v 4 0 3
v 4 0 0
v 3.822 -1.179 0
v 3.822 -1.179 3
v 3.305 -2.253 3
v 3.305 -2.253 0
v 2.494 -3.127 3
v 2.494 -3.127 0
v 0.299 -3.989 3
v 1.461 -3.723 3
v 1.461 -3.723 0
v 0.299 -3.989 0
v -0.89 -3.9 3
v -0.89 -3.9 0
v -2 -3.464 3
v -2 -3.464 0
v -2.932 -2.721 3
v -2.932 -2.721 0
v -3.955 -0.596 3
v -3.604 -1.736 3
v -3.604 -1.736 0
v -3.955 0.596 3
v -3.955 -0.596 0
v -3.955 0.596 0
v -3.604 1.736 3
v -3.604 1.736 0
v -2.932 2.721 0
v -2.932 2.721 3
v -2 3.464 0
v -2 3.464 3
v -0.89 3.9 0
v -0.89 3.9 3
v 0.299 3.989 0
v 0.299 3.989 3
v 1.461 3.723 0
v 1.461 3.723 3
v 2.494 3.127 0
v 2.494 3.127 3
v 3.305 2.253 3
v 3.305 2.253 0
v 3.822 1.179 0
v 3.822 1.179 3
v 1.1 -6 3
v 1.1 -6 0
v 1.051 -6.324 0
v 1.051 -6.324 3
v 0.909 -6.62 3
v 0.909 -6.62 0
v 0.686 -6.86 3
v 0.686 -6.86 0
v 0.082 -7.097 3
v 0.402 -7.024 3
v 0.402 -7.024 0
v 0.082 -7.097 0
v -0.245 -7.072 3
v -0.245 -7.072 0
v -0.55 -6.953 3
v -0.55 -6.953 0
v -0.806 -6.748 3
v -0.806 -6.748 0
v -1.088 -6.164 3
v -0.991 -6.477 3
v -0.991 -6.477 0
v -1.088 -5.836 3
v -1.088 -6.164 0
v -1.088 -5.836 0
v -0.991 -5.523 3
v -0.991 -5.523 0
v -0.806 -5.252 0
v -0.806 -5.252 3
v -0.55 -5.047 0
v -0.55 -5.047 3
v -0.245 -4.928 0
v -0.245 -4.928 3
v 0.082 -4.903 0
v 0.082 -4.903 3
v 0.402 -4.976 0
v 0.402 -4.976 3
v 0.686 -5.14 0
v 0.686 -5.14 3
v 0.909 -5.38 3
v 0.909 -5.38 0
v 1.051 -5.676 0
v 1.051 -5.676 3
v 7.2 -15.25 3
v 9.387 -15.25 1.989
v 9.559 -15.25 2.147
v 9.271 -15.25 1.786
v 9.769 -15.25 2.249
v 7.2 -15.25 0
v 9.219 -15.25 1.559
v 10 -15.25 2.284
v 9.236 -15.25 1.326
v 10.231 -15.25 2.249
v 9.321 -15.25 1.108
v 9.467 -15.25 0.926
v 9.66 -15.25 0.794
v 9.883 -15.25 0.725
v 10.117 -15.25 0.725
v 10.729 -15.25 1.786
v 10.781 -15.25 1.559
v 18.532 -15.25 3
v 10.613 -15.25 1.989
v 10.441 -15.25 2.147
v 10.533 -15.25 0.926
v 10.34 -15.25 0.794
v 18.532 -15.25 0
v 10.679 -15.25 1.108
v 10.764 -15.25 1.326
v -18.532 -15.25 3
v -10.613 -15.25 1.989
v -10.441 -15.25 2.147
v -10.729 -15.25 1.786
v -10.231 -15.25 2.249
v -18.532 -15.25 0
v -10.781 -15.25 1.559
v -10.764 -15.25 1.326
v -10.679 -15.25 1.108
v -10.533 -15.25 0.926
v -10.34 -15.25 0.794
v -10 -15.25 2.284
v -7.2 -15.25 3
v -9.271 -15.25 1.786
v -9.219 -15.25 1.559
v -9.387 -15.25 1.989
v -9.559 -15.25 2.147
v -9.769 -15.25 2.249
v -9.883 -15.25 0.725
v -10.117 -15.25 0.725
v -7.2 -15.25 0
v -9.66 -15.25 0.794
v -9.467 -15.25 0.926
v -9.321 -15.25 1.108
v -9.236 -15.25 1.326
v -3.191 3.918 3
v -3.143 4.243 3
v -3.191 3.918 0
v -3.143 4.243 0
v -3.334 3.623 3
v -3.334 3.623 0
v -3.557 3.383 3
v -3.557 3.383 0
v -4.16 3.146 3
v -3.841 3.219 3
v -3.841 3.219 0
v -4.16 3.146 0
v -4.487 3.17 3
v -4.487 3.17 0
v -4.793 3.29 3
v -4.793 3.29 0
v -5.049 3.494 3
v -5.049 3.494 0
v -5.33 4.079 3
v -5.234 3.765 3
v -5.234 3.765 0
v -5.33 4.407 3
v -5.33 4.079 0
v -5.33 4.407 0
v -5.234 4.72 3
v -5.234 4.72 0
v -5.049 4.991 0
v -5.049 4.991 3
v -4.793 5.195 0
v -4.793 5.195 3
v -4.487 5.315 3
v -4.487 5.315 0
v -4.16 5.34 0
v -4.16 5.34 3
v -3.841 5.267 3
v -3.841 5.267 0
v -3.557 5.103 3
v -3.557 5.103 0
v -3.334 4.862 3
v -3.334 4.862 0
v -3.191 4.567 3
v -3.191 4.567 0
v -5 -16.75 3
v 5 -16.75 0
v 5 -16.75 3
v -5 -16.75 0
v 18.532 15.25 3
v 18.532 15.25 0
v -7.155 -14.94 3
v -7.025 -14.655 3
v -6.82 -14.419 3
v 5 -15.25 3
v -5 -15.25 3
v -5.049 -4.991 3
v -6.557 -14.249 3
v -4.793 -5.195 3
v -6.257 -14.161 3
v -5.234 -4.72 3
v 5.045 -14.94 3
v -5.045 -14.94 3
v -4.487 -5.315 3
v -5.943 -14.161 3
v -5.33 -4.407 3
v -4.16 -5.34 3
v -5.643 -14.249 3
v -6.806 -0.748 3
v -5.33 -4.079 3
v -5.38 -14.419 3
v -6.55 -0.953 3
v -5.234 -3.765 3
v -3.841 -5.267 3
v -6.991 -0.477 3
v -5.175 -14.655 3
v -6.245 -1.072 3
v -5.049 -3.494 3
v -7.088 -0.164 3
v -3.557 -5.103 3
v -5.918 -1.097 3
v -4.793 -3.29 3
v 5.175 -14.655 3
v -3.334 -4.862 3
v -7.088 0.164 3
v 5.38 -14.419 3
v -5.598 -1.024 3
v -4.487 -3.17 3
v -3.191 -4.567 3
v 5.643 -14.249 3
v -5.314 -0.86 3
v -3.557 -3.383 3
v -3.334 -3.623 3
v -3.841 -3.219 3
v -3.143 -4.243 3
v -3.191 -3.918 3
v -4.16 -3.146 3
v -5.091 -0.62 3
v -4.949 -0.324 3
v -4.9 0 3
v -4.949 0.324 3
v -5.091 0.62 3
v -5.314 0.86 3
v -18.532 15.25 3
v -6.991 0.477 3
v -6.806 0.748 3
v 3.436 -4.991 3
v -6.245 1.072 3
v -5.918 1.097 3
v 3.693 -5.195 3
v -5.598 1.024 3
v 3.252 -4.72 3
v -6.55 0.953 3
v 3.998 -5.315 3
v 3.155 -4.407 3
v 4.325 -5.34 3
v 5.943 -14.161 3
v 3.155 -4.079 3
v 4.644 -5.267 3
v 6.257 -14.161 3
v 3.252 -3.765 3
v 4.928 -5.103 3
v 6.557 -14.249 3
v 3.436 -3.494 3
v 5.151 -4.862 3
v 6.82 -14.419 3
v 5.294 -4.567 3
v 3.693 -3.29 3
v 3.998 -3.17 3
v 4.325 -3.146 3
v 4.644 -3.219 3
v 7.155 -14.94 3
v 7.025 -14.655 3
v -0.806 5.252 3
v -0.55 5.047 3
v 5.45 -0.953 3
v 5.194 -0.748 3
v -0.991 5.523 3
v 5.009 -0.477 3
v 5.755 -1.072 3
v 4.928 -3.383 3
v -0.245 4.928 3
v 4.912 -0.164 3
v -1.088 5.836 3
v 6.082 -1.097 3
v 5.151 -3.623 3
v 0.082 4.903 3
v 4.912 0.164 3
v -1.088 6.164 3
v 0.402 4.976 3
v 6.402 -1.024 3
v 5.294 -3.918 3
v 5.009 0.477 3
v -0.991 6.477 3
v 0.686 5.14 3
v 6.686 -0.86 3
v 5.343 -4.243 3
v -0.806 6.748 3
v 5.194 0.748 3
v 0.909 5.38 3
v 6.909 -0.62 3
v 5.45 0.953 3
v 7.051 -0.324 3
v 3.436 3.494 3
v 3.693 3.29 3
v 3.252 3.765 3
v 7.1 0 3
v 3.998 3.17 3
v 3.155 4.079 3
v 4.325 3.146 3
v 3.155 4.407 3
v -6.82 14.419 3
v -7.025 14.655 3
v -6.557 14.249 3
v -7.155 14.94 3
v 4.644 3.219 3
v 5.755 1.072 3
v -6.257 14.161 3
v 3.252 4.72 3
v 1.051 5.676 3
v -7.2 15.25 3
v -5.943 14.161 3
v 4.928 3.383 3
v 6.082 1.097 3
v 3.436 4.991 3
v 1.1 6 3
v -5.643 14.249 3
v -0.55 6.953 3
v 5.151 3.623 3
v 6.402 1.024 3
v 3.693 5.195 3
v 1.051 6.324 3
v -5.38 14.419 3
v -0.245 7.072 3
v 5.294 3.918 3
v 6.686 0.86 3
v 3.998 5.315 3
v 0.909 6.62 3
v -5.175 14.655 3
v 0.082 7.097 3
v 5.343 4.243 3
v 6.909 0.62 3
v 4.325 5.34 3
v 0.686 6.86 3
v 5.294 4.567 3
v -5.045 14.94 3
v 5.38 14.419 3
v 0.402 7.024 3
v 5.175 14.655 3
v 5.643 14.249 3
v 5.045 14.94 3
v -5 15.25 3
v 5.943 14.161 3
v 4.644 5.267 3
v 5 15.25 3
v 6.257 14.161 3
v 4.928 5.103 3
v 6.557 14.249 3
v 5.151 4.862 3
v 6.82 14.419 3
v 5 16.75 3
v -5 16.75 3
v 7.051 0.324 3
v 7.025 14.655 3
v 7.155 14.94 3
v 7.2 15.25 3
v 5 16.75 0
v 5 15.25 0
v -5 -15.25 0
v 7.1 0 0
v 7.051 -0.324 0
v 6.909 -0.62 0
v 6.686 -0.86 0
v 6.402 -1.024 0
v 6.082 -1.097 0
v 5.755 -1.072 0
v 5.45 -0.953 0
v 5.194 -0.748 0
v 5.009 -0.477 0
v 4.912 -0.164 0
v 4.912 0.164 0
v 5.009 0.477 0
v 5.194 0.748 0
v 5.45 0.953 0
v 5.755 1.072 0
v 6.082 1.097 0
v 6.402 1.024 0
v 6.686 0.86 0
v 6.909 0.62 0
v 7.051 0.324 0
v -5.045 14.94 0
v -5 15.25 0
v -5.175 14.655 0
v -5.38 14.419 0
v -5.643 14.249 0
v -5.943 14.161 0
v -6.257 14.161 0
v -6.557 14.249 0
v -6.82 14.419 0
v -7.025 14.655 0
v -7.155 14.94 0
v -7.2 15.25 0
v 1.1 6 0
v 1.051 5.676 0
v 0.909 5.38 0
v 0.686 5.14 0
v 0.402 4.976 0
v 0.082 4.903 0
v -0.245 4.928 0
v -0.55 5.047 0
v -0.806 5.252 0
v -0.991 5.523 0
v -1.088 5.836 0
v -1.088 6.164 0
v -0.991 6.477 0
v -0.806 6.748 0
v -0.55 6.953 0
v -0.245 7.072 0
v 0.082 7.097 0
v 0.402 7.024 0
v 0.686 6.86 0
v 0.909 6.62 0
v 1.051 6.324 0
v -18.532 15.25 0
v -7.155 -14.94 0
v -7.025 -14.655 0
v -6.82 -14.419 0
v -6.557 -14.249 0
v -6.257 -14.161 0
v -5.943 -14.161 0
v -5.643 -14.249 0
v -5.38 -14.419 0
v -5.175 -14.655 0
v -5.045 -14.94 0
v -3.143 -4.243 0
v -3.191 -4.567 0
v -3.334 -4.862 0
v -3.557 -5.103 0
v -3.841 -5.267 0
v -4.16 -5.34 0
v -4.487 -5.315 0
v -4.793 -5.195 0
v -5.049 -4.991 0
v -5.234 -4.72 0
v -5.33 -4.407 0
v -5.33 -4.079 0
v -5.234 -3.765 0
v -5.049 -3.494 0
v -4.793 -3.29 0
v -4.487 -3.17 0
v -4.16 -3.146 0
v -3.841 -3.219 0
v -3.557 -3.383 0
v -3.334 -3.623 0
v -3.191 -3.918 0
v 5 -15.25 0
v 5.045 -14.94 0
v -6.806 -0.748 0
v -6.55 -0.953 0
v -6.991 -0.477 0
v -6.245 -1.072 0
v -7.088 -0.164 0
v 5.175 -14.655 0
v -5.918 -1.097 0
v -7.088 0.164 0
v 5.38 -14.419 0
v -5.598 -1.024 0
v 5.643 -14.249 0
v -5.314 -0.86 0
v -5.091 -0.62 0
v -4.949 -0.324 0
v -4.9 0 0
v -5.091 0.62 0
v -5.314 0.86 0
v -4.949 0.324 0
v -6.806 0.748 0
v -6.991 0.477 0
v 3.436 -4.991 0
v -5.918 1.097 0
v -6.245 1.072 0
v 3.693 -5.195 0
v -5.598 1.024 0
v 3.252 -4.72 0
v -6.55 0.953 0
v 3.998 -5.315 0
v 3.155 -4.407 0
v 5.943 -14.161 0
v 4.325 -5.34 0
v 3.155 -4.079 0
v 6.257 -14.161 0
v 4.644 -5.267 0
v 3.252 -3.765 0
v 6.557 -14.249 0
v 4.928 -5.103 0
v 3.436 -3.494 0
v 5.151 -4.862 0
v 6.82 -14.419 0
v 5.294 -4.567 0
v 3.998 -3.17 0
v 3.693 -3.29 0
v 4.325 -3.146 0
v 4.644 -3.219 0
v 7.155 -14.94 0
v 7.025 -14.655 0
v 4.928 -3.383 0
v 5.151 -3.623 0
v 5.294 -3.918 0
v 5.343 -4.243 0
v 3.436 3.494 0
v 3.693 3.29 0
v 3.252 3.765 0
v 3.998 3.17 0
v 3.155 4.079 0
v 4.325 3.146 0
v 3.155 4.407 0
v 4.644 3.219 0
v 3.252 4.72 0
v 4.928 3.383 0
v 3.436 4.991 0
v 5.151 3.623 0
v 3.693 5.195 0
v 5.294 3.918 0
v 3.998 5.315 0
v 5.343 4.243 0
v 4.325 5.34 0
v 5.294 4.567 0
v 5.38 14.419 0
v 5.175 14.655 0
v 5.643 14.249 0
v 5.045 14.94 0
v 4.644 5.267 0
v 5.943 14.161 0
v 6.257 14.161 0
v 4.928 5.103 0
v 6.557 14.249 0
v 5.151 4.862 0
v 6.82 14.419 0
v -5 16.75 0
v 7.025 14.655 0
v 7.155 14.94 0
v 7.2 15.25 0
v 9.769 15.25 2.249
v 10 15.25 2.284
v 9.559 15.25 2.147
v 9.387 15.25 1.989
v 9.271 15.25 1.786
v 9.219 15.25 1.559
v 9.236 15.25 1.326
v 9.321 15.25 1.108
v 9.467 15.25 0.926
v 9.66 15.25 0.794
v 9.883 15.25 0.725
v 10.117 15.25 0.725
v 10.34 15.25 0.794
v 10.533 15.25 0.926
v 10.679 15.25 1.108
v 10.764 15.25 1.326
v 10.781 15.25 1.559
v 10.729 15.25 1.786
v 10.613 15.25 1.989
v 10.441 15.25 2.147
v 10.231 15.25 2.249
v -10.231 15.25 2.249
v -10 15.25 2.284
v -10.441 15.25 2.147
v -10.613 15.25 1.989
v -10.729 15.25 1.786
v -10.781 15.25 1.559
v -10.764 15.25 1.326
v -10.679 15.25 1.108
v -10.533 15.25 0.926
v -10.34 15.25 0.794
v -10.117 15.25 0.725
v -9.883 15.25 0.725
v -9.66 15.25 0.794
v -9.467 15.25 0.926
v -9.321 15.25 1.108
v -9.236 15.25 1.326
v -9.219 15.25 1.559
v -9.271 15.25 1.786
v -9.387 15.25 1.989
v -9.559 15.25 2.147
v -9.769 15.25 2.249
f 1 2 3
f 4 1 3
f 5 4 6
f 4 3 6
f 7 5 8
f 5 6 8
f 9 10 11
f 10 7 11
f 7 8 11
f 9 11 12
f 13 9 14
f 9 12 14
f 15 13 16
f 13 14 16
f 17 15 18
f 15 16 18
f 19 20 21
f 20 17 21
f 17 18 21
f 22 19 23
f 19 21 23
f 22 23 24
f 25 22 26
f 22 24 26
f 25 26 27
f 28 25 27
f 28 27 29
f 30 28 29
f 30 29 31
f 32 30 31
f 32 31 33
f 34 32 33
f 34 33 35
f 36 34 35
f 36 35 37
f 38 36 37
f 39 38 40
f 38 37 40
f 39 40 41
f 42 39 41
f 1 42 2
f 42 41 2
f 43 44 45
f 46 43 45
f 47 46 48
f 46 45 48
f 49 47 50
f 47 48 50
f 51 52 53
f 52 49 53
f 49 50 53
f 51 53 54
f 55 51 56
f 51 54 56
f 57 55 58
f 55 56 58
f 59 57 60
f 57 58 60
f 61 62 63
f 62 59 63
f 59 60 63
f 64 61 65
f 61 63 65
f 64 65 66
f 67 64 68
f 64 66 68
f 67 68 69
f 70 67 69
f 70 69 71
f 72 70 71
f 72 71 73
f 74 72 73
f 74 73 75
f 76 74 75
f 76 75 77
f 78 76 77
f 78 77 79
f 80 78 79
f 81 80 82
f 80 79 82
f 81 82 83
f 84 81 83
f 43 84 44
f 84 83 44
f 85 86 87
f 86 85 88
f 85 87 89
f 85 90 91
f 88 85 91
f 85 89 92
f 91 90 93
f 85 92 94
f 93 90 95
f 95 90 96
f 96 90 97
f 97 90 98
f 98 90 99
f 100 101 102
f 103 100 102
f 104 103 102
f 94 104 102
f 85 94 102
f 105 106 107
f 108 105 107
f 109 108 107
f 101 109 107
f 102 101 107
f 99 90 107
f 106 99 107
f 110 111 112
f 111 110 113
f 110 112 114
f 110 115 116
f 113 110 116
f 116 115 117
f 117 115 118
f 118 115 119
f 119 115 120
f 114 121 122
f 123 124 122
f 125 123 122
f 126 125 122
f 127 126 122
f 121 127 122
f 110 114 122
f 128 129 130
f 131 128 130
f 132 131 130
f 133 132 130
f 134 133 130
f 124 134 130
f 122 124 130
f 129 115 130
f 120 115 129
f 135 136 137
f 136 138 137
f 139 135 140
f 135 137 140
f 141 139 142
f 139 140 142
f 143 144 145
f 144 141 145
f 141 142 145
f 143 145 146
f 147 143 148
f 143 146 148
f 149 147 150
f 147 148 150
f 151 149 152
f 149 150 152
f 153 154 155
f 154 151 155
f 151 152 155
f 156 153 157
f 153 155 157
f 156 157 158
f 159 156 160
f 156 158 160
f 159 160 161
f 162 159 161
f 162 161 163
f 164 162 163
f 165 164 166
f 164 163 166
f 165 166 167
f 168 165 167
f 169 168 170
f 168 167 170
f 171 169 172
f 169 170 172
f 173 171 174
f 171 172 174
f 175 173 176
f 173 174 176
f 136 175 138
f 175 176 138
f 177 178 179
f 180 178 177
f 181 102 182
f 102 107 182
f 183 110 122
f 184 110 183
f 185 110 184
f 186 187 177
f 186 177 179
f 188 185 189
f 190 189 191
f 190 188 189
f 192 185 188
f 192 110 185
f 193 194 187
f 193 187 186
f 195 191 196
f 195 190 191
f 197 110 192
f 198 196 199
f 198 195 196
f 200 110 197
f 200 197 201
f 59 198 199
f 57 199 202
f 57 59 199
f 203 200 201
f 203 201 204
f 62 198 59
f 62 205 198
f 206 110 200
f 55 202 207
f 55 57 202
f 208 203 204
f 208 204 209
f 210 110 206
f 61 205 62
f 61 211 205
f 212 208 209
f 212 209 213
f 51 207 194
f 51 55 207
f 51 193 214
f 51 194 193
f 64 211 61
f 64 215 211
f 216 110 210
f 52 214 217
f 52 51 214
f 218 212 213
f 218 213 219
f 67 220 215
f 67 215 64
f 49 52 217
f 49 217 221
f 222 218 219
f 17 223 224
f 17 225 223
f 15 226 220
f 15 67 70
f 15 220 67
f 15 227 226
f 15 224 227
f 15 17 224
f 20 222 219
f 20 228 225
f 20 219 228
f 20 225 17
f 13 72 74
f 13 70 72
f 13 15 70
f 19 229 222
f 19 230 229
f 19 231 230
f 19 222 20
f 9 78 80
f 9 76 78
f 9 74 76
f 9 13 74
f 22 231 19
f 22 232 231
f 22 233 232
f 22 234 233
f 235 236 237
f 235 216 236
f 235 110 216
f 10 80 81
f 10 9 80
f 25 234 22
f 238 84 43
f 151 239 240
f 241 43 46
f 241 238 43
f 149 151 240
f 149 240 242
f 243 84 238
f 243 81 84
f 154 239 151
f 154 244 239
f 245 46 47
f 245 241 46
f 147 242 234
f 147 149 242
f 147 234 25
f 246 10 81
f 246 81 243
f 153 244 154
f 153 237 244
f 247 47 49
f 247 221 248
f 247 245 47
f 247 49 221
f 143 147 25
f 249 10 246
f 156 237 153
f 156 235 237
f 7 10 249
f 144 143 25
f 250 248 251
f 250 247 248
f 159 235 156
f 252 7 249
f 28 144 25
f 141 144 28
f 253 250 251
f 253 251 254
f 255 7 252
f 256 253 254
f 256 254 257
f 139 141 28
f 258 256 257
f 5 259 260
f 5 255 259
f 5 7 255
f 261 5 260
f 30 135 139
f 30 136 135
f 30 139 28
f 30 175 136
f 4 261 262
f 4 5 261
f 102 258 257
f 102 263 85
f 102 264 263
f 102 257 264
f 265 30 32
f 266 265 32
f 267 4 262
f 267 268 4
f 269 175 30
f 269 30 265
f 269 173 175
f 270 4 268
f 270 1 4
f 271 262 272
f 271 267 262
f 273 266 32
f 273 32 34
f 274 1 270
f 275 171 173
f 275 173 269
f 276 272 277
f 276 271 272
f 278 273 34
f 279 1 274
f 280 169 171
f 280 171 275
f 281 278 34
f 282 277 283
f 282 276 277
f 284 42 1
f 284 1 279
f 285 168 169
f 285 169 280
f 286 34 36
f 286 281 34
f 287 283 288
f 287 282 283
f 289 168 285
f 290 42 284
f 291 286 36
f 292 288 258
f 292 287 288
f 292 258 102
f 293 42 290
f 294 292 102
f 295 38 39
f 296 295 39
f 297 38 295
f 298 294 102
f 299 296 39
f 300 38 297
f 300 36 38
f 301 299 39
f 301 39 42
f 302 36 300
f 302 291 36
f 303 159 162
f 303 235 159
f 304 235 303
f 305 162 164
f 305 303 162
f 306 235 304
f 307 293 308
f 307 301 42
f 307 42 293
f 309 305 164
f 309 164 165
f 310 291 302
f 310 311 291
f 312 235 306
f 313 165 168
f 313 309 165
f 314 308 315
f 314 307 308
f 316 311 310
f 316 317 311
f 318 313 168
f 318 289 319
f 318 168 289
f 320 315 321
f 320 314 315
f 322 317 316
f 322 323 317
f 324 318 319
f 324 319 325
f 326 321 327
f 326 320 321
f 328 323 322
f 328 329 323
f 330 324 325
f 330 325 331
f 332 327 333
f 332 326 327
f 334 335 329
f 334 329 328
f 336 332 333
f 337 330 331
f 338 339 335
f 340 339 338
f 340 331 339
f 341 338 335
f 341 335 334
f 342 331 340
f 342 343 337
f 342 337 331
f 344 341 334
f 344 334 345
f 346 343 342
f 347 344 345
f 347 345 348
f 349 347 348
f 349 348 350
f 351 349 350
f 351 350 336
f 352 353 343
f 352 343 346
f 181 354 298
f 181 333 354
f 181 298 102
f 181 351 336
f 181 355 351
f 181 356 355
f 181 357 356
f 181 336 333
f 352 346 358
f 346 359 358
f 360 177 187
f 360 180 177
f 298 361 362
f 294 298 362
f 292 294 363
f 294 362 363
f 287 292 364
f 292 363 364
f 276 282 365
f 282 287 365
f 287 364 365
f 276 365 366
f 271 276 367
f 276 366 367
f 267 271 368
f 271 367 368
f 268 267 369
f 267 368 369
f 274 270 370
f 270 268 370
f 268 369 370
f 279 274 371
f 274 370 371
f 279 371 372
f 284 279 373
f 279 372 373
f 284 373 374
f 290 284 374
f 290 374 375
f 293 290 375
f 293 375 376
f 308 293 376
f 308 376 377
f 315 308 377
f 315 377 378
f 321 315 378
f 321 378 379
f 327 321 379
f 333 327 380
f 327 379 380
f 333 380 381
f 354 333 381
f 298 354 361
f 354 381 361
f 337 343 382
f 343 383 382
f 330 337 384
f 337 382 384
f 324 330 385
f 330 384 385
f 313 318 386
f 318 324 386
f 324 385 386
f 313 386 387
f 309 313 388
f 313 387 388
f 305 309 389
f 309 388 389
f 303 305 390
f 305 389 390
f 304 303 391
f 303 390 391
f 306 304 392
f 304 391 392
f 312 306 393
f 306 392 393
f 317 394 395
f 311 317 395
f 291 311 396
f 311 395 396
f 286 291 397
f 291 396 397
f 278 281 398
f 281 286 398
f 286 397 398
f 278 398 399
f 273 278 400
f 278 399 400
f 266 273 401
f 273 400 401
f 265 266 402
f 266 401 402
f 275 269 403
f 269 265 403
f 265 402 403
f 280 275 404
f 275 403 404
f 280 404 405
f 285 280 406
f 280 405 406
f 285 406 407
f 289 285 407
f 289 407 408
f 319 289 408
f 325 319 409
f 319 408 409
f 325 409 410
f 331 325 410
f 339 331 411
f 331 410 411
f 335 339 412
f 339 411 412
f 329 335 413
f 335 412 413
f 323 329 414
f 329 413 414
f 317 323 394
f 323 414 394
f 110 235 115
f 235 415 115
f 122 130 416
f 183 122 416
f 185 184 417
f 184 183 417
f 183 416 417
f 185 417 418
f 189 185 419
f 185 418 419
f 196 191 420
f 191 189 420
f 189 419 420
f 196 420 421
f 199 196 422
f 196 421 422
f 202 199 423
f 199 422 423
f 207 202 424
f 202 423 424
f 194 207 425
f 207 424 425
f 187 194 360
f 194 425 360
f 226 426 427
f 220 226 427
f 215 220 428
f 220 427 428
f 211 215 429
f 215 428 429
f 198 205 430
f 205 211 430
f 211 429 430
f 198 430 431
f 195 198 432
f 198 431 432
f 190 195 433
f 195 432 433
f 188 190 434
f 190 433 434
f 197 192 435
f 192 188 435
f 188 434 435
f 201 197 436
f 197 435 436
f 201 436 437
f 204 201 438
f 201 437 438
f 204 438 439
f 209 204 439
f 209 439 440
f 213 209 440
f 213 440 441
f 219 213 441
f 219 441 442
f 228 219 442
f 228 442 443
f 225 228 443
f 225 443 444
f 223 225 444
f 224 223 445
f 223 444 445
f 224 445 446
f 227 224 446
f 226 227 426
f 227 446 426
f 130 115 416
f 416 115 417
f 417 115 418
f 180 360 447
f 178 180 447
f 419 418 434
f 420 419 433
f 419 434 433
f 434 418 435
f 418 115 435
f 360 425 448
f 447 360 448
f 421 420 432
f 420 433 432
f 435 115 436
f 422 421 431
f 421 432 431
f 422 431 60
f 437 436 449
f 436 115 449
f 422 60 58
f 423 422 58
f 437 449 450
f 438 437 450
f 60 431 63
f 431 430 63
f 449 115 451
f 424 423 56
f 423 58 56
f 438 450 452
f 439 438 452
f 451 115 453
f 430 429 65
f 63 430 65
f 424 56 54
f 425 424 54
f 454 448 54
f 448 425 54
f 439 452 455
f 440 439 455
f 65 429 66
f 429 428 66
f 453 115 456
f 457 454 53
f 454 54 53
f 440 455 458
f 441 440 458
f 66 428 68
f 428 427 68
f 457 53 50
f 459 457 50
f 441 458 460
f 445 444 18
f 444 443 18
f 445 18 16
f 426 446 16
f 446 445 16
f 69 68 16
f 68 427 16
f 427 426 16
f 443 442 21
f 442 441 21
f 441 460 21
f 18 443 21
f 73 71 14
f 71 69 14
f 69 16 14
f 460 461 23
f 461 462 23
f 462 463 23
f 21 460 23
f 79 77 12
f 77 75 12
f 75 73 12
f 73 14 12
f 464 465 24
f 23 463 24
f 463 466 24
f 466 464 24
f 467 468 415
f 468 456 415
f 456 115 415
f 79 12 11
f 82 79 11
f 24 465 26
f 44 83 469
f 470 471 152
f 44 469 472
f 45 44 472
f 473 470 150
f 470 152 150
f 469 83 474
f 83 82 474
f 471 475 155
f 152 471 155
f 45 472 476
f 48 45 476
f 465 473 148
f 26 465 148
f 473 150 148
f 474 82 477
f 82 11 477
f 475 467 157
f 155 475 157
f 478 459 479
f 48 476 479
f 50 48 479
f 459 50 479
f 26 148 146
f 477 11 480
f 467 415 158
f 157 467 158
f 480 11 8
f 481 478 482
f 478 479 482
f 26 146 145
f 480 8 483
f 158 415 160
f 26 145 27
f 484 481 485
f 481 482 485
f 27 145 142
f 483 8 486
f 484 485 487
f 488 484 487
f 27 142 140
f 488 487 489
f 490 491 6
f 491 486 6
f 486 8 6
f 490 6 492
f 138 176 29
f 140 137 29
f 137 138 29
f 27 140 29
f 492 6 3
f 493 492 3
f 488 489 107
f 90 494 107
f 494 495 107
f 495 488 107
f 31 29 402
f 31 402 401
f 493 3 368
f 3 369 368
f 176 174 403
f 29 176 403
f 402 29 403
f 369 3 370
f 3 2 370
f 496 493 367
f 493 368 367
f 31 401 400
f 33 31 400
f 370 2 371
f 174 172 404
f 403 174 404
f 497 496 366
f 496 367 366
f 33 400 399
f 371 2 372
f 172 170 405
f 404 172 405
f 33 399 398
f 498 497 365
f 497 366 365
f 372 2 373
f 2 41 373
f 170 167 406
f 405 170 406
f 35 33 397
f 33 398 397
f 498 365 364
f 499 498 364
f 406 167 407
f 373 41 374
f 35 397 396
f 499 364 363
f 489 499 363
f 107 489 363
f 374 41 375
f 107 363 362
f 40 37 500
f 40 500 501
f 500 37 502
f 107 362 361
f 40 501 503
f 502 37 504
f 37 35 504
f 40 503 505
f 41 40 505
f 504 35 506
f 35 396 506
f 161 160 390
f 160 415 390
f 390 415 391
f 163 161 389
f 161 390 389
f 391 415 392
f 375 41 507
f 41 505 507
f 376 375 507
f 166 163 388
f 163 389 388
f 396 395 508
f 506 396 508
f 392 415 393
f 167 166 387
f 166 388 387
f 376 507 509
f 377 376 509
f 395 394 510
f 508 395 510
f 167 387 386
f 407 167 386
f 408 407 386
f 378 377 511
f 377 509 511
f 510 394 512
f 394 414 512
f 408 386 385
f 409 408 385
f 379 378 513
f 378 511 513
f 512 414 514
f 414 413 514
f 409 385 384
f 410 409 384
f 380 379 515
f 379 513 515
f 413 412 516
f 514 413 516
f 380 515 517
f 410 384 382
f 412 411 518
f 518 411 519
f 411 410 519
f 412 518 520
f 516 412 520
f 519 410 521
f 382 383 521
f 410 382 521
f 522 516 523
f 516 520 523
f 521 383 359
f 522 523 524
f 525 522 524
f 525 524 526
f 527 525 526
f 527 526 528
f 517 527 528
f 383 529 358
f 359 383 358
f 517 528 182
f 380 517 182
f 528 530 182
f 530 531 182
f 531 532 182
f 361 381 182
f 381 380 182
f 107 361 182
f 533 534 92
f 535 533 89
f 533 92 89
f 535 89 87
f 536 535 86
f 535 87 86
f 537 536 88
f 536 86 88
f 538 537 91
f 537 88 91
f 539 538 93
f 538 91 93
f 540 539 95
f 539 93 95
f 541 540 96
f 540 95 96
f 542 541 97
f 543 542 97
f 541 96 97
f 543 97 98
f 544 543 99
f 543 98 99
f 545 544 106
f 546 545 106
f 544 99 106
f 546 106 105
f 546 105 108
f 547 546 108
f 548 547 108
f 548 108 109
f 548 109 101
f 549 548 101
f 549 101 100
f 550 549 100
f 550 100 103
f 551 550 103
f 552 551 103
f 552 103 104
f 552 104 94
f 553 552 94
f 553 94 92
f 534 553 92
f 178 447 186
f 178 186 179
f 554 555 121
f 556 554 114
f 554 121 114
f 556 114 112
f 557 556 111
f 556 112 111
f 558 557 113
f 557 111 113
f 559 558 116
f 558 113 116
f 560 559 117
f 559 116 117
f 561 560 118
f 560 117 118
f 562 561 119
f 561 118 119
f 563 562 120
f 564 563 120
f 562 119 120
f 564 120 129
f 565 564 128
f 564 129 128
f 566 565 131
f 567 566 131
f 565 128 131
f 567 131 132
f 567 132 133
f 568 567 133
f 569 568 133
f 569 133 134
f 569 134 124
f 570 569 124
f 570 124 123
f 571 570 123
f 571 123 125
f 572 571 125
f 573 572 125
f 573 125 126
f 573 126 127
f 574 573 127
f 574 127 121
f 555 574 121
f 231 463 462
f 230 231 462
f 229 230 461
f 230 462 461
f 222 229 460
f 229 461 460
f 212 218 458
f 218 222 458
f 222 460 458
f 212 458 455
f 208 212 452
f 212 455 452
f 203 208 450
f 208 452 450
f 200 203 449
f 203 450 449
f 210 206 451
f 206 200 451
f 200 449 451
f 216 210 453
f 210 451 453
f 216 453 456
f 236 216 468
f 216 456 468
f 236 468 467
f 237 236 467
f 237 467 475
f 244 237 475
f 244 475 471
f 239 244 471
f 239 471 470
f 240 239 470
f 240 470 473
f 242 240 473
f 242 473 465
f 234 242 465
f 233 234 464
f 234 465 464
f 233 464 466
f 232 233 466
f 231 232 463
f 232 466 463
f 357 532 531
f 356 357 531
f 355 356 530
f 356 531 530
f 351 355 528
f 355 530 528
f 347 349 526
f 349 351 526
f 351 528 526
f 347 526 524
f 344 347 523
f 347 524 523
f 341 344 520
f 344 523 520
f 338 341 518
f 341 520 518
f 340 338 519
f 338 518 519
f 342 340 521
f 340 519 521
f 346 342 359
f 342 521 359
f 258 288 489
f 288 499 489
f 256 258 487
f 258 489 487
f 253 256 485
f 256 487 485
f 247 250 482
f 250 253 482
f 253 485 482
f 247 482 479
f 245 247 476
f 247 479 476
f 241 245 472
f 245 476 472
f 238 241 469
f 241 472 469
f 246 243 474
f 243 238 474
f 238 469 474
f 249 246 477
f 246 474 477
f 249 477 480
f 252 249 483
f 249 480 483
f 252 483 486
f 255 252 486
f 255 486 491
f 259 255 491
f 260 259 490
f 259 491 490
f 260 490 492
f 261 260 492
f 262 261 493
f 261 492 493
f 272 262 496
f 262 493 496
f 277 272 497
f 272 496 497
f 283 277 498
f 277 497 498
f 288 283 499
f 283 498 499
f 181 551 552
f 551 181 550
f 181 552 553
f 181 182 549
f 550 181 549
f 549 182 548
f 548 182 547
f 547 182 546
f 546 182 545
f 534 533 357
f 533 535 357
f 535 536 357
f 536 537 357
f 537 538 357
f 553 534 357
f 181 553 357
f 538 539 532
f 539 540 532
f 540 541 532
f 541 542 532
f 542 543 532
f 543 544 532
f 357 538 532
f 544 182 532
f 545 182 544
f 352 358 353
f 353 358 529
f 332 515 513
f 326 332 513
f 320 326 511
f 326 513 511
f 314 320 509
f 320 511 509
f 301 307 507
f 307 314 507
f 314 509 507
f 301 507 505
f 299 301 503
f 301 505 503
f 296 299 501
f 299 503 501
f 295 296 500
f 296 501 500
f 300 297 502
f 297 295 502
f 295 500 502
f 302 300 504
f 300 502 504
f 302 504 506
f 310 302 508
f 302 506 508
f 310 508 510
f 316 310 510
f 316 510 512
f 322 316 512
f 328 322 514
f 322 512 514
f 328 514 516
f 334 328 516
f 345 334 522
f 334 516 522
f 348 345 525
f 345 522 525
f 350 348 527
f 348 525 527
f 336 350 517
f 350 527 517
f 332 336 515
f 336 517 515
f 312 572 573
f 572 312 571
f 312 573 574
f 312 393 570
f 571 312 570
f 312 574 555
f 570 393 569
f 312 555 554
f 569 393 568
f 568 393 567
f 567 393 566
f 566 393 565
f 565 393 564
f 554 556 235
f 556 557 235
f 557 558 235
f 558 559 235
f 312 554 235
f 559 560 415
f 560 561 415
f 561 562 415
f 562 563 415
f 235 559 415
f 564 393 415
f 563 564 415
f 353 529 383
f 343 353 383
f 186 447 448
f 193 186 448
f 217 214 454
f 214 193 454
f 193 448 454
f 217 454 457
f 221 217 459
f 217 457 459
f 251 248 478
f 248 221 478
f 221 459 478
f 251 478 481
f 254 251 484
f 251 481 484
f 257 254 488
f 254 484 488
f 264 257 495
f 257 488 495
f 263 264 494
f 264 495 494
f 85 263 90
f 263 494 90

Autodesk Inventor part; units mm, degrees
ref_plane "YZ Plane" through (0, 0, 0) normal (1, 0, 0) x (0, 1, 0)
ref_plane "XZ Plane" through (0, 0, 0) normal (0, 1, 0) x (-1, 0, 0)
ref_plane "XY Plane" through (0, 0, 0) normal (0, 0, 1) x (1, 0, 0)
sketch "スケッチ1" plane through (0, 0, 0) normal (0, 0, 1) x (1, 0, 0)
  circle A0 centre (0, 0) radius 4
  circle A1 centre (0, 0) radius 6 construction
  circle A2 centre (0, 6) radius 1.1
  circle A3 centre (-4.2426, 4.2426) radius 1.1
  circle A4 centre (-6, 0) radius 1.1
  circle A5 centre (-4.2426, -4.2426) radius 1.1
  circle A6 centre (0, -6) radius 1.1
  circle A7 centre (4.2426, -4.2426) radius 1.1
  circle A8 centre (6, 0) radius 1.1
  circle A9 centre (4.2426, 4.2426) radius 1.1
  line L0 (-18.5321, -15.25) -> (18.5321, -15.25)
  line L1 (18.5321, -15.25) -> (18.5321, 15.25)
  line L2 (18.5321, 15.25) -> (-18.5321, 15.25)
  line L3 (-18.5321, 15.25) -> (-18.5321, -15.25)
  line L4 (-18.5321, -15.25) -> (18.5321, 15.25) construction
  line L5 (18.5321, -15.25) -> (-18.5321, 15.25) construction
  circle A10 centre (0, 0) radius 24
  line L6 (18.5321, 0) -> (-18.5321, 0) construction
  line L7 (0, 18.25) -> (0, 0) construction
  line L8 (-5, 15.25) -> (5, 15.25)
  line L9 (5, 15.25) -> (5, 16.75)
  line L10 (5, 16.75) -> (-5, 16.75)
  line L11 (-5, 16.75) -> (-5, 15.25)
  circle A11 centre (-6.1, 15.25) radius 1.1
  circle A12 centre (6.1, 15.25) radius 1.1
  line L12 (-5, -15.25) -> (5, -15.25)
  line L13 (5, -15.25) -> (5, -16.75)
  line L14 (5, -16.75) -> (-5, -16.75)
  line L15 (-5, -16.75) -> (-5, -15.25)
  circle A13 centre (-6.1, -15.25) radius 1.1
  circle A14 centre (6.1, -15.25) radius 1.1
  point P0 (0, 16.75)
  point P1 (0, -18.25)
  point P2 (0, -16.75)
  point P3 (7.2, 15.25)
  point P4 (-7.2, 15.25)
  point P5 (7.2, -15.25)
  point P6 (-7.2, -15.25)
  dimension "d1" = 12
  dimension "d11" = 48
  dimension "d23" = 2.2
  dimension "d24" = 2.2
  dimension "d0" = 8
  dimension "d2" = 2.2
  dimension "d5" = 360
  dimension "d20" = 30.5
  dimension "d21" = 1.5
  dimension "d22" = 10
extrude "押し出し1" add sketch "スケッチ1" along normal blind 3 contours A13 L0 L3 L2 A11 A12 L1 A14 | L0 L13 L14 L15 | L0 A13 | A14 L0 | L2 A11 | A12 L2 | L11 L10 L9 L2 picked at (-6.0558, -14.886) picked at (6.1442, -14.886) picked at (-6.1442, 14.886) picked at (6.0558, 14.886)
extrude "押し出し2" cut sketch "スケッチ1" along normal blind 3 contours L0 A13 | A14 L0 | L2 A11 | A12 L2 picked at (-6.0558, -14.886) picked at (6.1442, -14.886) picked at (-6.1442, 14.886) picked at (6.0558, 14.886)
sketch "スケッチ2" plane through (18.5321, 15.25, 3) normal (0, 1, 0) x (1, 0, 0)
  line L0 (-13.5321, 3) -> (-13.5321, 0) projected
  line L1 (-23.5321, 3) -> (-23.5321, 0) projected
  point P0 (-18.5321, 3)
  point P1 (-8.5321, 1.5)
  point P2 (-28.5321, 1.5)
  point P3 (-13.5321, 1.5)
  point P4 (-23.5321, 1.5)
  dimension "d27" = 5
  dimension "d28" = 5
hole "穴1" at (10, 15.25, 1.5) at (-10, 15.25, 1.5) direction (0, -1, 0) diameter 1.567 end through all thread size "M2x0.4" class "6H" standard "ISO Metric profile"
equation "\"d28\" = d27"
properties part number "kosi_sita"
